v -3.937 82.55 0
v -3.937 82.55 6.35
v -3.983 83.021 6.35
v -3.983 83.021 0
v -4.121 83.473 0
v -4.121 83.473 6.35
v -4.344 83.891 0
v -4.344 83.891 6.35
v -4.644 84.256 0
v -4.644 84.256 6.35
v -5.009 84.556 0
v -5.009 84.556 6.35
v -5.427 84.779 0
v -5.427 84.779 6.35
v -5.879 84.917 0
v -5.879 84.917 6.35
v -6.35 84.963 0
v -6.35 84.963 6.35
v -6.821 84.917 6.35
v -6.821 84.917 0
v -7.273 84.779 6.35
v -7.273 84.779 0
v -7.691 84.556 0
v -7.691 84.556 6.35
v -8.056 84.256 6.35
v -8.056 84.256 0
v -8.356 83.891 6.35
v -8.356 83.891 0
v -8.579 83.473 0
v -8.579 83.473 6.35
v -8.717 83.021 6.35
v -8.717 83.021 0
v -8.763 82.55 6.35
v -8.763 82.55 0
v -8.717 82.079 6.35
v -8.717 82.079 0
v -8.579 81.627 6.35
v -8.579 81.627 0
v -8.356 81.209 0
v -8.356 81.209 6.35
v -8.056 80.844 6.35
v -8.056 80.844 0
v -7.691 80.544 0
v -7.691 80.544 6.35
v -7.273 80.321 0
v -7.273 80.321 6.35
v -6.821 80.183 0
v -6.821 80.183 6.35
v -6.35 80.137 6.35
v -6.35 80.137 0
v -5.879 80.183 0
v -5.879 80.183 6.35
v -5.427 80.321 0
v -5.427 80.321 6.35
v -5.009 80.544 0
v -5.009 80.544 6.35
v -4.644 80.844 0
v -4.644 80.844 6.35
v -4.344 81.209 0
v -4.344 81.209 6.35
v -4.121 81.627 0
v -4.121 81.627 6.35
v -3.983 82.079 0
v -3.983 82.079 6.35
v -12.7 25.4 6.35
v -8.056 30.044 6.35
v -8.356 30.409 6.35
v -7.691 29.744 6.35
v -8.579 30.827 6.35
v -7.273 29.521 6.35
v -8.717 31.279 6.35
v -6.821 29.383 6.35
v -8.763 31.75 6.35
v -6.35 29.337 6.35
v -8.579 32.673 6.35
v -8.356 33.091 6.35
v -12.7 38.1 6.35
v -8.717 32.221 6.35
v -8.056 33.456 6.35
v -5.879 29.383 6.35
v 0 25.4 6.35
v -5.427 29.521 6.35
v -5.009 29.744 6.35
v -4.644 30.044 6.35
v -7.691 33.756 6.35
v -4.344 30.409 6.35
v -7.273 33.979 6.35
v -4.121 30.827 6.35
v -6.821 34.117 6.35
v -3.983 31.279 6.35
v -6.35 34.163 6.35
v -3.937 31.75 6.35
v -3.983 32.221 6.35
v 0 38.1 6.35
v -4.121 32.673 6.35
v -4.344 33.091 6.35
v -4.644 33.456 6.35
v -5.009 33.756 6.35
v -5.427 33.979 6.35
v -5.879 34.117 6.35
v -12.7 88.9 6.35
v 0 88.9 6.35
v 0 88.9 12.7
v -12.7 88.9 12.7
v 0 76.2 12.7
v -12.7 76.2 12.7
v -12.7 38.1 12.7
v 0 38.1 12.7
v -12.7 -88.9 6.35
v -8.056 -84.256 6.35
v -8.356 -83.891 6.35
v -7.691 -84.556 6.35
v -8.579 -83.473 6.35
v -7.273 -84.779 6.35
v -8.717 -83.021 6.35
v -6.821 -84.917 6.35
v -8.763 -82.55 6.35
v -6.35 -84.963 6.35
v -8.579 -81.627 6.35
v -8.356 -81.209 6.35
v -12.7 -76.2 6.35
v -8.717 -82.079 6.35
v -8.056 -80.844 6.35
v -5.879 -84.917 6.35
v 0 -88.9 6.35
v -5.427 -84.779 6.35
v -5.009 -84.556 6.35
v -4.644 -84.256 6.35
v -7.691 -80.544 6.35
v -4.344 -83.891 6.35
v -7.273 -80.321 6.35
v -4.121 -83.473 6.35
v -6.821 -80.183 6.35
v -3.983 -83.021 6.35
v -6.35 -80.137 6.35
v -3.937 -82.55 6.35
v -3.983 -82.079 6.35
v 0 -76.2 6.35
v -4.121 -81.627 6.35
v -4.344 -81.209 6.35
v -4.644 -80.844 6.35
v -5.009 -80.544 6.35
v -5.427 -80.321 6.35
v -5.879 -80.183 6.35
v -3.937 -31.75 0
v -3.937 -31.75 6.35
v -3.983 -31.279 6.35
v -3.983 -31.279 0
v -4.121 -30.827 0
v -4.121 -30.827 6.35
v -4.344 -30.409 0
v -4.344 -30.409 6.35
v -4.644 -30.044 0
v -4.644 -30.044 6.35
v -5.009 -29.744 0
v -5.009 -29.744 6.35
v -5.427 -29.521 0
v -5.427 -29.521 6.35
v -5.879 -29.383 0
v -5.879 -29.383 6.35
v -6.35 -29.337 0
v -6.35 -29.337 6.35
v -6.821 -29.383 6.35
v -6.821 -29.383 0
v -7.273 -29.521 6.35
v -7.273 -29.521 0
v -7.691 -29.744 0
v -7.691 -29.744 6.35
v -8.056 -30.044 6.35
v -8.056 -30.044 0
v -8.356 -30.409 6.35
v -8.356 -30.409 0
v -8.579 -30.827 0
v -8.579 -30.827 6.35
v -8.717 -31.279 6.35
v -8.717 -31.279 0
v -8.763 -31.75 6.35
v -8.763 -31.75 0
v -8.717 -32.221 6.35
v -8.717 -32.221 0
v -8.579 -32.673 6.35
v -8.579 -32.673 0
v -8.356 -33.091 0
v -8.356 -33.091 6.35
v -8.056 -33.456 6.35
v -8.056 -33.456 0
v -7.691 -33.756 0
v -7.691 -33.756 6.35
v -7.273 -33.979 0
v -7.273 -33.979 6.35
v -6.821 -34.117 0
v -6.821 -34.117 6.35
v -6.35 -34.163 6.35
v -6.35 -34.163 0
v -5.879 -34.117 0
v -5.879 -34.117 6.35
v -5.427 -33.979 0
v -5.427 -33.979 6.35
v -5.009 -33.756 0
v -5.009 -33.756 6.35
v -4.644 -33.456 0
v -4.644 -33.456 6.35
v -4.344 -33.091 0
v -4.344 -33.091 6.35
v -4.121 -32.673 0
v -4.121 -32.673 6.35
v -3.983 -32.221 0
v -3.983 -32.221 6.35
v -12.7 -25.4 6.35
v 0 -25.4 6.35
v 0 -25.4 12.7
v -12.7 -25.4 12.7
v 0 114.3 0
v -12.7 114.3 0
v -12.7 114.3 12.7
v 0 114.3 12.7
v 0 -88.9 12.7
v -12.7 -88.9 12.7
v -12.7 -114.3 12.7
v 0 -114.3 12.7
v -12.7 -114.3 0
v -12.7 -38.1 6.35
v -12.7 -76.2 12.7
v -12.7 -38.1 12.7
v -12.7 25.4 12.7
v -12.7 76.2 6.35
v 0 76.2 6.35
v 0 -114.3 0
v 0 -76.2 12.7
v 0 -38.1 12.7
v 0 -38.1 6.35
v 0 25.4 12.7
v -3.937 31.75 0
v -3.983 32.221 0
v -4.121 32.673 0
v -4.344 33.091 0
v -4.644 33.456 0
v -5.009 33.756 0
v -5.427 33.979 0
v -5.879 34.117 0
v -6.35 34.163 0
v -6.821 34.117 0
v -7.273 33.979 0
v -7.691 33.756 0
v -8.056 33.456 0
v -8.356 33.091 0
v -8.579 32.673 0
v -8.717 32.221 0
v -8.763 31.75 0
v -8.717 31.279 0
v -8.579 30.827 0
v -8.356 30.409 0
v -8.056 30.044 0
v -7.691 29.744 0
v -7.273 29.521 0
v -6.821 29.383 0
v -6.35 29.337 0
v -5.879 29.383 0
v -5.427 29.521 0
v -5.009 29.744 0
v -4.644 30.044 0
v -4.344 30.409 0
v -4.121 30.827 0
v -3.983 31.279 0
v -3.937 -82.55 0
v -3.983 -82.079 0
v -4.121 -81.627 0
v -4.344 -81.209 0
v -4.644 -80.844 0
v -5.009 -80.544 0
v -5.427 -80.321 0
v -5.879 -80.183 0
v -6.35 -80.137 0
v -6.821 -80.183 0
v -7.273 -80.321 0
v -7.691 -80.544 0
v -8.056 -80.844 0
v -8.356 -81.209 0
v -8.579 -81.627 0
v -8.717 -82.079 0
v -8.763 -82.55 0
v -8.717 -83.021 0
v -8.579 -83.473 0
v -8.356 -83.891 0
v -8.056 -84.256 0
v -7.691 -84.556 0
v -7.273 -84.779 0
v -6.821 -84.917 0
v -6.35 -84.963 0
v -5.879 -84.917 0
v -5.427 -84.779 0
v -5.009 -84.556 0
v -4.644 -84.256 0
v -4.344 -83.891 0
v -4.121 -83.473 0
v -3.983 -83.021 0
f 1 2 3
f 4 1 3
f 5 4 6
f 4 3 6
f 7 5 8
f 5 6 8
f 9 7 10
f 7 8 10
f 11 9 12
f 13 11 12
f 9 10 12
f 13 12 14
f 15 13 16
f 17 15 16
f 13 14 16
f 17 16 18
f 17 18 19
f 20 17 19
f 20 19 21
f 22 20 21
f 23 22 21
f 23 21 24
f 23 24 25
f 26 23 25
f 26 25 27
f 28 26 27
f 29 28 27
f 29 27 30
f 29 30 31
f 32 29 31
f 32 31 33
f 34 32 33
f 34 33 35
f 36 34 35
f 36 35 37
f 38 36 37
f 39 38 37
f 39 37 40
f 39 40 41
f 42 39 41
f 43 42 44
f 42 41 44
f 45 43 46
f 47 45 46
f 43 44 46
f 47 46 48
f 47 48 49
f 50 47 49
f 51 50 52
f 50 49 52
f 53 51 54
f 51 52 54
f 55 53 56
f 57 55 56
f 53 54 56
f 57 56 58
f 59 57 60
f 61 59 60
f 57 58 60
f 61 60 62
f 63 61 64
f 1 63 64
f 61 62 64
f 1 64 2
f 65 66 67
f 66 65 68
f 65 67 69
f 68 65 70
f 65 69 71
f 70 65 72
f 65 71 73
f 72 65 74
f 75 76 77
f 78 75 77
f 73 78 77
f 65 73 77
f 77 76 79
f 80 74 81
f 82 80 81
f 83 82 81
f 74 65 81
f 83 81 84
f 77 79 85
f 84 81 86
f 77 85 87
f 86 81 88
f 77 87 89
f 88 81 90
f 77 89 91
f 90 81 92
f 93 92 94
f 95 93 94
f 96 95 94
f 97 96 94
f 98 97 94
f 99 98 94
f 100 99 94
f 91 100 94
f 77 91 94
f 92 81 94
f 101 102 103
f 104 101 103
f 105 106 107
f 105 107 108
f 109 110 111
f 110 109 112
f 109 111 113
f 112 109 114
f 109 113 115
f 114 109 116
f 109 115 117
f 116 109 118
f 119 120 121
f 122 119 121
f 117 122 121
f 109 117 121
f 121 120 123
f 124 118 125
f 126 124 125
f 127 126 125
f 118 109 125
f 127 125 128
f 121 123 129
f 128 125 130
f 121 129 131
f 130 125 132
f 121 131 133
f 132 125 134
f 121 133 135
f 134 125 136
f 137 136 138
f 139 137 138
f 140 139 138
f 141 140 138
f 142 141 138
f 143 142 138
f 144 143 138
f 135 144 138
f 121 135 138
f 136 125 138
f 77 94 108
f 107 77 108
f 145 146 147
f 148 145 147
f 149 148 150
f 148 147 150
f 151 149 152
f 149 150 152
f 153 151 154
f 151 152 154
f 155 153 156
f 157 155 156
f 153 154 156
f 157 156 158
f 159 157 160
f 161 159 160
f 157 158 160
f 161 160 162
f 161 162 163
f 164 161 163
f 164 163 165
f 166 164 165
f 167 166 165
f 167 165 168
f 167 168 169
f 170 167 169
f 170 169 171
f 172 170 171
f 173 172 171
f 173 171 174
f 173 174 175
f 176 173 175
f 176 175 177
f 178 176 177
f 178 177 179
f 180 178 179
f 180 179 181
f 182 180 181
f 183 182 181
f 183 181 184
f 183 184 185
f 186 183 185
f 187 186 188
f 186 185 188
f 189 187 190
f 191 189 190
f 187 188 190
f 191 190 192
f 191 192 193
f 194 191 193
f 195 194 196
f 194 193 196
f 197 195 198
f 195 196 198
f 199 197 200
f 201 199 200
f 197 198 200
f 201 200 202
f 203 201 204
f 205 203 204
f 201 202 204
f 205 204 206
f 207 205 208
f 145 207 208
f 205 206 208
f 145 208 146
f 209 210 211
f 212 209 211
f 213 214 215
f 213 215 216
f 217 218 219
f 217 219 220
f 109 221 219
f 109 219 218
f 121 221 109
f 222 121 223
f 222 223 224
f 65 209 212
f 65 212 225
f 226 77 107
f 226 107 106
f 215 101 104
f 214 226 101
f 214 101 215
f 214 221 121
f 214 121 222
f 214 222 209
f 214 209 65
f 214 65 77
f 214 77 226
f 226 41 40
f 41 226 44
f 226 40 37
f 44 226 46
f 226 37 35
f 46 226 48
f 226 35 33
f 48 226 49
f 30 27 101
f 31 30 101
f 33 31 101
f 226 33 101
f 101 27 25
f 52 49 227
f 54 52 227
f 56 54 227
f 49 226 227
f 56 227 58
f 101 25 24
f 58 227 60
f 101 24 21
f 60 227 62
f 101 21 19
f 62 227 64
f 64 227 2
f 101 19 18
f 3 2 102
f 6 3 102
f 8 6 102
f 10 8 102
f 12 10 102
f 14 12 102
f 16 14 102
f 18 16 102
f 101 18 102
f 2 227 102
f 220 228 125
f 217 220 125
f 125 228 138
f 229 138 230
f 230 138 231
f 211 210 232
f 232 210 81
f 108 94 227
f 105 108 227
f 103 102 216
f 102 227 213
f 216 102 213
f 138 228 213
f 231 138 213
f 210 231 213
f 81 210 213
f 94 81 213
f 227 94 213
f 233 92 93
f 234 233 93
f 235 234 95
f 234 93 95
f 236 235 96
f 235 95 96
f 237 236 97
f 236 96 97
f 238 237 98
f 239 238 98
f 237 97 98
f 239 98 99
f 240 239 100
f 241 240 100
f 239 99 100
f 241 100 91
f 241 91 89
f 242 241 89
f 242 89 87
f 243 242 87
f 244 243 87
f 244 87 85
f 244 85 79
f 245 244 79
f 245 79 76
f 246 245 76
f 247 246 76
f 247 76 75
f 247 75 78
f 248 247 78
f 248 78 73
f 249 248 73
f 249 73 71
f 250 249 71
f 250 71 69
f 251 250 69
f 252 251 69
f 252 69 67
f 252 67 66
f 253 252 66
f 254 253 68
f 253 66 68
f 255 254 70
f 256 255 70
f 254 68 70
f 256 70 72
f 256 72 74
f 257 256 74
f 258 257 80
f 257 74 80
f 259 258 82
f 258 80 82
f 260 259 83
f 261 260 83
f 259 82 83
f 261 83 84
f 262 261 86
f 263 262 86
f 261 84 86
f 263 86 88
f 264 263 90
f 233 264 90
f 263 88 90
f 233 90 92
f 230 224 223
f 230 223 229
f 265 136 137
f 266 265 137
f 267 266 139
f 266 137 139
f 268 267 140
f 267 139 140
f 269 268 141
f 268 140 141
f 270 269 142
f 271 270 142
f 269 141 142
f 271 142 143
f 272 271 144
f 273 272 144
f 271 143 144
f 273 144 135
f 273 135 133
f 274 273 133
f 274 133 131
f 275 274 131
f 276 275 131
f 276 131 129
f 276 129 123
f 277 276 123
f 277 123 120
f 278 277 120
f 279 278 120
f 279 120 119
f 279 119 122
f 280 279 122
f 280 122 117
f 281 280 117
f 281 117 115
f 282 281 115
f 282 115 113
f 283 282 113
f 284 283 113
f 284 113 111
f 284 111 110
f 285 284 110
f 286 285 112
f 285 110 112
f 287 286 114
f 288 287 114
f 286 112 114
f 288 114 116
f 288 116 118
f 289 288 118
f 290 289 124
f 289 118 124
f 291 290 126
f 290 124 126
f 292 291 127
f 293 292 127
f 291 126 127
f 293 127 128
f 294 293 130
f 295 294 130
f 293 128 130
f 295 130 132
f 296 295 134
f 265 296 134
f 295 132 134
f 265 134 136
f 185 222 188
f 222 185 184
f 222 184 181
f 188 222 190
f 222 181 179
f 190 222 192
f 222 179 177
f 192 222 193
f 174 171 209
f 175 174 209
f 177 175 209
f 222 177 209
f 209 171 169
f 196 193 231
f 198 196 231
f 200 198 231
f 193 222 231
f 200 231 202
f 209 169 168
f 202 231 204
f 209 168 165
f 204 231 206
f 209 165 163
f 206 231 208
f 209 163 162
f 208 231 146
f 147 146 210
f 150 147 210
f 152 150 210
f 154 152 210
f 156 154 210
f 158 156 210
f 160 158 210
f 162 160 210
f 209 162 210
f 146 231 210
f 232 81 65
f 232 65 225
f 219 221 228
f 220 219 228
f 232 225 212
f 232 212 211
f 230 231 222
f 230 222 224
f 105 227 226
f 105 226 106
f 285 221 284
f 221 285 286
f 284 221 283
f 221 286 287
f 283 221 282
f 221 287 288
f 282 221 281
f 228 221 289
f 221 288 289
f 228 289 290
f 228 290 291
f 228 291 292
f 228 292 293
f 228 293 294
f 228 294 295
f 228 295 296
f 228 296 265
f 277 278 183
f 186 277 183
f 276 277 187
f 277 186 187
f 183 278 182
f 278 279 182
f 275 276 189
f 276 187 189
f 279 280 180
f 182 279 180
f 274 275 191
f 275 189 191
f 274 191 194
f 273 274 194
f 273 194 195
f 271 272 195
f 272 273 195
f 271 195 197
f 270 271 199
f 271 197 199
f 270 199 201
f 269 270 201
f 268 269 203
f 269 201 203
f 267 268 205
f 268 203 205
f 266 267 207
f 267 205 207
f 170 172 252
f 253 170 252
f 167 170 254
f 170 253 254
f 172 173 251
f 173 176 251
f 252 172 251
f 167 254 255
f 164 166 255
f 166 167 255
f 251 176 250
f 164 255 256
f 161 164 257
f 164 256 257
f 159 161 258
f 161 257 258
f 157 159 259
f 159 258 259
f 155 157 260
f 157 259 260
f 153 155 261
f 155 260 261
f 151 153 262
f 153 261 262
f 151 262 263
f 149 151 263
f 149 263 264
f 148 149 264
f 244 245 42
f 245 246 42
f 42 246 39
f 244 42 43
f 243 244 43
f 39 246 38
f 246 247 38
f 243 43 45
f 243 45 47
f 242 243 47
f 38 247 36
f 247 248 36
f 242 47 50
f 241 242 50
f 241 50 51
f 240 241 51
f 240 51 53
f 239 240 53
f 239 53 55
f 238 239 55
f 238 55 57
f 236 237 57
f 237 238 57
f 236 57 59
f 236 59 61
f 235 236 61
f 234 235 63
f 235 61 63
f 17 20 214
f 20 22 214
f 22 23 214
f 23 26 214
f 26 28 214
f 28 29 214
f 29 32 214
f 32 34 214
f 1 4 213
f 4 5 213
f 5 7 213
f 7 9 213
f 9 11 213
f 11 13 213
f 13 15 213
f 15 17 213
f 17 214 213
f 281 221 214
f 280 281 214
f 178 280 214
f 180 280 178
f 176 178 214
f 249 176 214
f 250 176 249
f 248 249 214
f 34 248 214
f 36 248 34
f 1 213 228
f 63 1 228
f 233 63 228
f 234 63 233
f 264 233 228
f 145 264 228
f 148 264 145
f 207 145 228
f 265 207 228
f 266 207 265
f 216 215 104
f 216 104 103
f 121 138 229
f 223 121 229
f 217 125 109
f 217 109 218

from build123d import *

# Parameters (mm, degrees)
F0_W     = 12.7
F0_H     = 228.6
F1_DEPTH = 12.7
F2_W     = 12.7
F2_H     = 6.35
F3_DEPTH = 12.701
F4_R     = 2.413
F5_DEPTH = 6.351


with BuildPart() as f1:
    # F0 (on Top) → F1 (new body)
    with BuildSketch(Plane.XY):
        with Locations((-6.35, 0)):
            Rectangle(F0_W, F0_H)
    extrude(amount=F1_DEPTH)

    # F2 (on face) → F3 (cut, through all)
    with BuildSketch(Plane.YZ):
        with Locations((82.55, 9.525)):
            Rectangle(F2_W, F2_H)
        with Locations((31.75, 9.525)):
            Rectangle(F2_W, F2_H)
        with Locations((-31.75, 9.525)):
            Rectangle(F2_W, F2_H)
        with Locations((-82.55, 9.525)):
            Rectangle(F2_W, F2_H)
    extrude(amount=-F3_DEPTH, mode=Mode.SUBTRACT)

    # F4 (on face) → F5 (cut, through all)
    with BuildSketch(Plane.XY.offset(6.35)):
        with Locations((-6.35, 82.55)):
            Circle(F4_R)
        with Locations((-6.35, 31.75)):
            Circle(F4_R)
        with Locations((-6.35, -31.75)):
            Circle(F4_R)
        with Locations((-6.35, -82.55)):
            Circle(F4_R)
    extrude(amount=-F5_DEPTH, mode=Mode.SUBTRACT)


solid = f1.part
